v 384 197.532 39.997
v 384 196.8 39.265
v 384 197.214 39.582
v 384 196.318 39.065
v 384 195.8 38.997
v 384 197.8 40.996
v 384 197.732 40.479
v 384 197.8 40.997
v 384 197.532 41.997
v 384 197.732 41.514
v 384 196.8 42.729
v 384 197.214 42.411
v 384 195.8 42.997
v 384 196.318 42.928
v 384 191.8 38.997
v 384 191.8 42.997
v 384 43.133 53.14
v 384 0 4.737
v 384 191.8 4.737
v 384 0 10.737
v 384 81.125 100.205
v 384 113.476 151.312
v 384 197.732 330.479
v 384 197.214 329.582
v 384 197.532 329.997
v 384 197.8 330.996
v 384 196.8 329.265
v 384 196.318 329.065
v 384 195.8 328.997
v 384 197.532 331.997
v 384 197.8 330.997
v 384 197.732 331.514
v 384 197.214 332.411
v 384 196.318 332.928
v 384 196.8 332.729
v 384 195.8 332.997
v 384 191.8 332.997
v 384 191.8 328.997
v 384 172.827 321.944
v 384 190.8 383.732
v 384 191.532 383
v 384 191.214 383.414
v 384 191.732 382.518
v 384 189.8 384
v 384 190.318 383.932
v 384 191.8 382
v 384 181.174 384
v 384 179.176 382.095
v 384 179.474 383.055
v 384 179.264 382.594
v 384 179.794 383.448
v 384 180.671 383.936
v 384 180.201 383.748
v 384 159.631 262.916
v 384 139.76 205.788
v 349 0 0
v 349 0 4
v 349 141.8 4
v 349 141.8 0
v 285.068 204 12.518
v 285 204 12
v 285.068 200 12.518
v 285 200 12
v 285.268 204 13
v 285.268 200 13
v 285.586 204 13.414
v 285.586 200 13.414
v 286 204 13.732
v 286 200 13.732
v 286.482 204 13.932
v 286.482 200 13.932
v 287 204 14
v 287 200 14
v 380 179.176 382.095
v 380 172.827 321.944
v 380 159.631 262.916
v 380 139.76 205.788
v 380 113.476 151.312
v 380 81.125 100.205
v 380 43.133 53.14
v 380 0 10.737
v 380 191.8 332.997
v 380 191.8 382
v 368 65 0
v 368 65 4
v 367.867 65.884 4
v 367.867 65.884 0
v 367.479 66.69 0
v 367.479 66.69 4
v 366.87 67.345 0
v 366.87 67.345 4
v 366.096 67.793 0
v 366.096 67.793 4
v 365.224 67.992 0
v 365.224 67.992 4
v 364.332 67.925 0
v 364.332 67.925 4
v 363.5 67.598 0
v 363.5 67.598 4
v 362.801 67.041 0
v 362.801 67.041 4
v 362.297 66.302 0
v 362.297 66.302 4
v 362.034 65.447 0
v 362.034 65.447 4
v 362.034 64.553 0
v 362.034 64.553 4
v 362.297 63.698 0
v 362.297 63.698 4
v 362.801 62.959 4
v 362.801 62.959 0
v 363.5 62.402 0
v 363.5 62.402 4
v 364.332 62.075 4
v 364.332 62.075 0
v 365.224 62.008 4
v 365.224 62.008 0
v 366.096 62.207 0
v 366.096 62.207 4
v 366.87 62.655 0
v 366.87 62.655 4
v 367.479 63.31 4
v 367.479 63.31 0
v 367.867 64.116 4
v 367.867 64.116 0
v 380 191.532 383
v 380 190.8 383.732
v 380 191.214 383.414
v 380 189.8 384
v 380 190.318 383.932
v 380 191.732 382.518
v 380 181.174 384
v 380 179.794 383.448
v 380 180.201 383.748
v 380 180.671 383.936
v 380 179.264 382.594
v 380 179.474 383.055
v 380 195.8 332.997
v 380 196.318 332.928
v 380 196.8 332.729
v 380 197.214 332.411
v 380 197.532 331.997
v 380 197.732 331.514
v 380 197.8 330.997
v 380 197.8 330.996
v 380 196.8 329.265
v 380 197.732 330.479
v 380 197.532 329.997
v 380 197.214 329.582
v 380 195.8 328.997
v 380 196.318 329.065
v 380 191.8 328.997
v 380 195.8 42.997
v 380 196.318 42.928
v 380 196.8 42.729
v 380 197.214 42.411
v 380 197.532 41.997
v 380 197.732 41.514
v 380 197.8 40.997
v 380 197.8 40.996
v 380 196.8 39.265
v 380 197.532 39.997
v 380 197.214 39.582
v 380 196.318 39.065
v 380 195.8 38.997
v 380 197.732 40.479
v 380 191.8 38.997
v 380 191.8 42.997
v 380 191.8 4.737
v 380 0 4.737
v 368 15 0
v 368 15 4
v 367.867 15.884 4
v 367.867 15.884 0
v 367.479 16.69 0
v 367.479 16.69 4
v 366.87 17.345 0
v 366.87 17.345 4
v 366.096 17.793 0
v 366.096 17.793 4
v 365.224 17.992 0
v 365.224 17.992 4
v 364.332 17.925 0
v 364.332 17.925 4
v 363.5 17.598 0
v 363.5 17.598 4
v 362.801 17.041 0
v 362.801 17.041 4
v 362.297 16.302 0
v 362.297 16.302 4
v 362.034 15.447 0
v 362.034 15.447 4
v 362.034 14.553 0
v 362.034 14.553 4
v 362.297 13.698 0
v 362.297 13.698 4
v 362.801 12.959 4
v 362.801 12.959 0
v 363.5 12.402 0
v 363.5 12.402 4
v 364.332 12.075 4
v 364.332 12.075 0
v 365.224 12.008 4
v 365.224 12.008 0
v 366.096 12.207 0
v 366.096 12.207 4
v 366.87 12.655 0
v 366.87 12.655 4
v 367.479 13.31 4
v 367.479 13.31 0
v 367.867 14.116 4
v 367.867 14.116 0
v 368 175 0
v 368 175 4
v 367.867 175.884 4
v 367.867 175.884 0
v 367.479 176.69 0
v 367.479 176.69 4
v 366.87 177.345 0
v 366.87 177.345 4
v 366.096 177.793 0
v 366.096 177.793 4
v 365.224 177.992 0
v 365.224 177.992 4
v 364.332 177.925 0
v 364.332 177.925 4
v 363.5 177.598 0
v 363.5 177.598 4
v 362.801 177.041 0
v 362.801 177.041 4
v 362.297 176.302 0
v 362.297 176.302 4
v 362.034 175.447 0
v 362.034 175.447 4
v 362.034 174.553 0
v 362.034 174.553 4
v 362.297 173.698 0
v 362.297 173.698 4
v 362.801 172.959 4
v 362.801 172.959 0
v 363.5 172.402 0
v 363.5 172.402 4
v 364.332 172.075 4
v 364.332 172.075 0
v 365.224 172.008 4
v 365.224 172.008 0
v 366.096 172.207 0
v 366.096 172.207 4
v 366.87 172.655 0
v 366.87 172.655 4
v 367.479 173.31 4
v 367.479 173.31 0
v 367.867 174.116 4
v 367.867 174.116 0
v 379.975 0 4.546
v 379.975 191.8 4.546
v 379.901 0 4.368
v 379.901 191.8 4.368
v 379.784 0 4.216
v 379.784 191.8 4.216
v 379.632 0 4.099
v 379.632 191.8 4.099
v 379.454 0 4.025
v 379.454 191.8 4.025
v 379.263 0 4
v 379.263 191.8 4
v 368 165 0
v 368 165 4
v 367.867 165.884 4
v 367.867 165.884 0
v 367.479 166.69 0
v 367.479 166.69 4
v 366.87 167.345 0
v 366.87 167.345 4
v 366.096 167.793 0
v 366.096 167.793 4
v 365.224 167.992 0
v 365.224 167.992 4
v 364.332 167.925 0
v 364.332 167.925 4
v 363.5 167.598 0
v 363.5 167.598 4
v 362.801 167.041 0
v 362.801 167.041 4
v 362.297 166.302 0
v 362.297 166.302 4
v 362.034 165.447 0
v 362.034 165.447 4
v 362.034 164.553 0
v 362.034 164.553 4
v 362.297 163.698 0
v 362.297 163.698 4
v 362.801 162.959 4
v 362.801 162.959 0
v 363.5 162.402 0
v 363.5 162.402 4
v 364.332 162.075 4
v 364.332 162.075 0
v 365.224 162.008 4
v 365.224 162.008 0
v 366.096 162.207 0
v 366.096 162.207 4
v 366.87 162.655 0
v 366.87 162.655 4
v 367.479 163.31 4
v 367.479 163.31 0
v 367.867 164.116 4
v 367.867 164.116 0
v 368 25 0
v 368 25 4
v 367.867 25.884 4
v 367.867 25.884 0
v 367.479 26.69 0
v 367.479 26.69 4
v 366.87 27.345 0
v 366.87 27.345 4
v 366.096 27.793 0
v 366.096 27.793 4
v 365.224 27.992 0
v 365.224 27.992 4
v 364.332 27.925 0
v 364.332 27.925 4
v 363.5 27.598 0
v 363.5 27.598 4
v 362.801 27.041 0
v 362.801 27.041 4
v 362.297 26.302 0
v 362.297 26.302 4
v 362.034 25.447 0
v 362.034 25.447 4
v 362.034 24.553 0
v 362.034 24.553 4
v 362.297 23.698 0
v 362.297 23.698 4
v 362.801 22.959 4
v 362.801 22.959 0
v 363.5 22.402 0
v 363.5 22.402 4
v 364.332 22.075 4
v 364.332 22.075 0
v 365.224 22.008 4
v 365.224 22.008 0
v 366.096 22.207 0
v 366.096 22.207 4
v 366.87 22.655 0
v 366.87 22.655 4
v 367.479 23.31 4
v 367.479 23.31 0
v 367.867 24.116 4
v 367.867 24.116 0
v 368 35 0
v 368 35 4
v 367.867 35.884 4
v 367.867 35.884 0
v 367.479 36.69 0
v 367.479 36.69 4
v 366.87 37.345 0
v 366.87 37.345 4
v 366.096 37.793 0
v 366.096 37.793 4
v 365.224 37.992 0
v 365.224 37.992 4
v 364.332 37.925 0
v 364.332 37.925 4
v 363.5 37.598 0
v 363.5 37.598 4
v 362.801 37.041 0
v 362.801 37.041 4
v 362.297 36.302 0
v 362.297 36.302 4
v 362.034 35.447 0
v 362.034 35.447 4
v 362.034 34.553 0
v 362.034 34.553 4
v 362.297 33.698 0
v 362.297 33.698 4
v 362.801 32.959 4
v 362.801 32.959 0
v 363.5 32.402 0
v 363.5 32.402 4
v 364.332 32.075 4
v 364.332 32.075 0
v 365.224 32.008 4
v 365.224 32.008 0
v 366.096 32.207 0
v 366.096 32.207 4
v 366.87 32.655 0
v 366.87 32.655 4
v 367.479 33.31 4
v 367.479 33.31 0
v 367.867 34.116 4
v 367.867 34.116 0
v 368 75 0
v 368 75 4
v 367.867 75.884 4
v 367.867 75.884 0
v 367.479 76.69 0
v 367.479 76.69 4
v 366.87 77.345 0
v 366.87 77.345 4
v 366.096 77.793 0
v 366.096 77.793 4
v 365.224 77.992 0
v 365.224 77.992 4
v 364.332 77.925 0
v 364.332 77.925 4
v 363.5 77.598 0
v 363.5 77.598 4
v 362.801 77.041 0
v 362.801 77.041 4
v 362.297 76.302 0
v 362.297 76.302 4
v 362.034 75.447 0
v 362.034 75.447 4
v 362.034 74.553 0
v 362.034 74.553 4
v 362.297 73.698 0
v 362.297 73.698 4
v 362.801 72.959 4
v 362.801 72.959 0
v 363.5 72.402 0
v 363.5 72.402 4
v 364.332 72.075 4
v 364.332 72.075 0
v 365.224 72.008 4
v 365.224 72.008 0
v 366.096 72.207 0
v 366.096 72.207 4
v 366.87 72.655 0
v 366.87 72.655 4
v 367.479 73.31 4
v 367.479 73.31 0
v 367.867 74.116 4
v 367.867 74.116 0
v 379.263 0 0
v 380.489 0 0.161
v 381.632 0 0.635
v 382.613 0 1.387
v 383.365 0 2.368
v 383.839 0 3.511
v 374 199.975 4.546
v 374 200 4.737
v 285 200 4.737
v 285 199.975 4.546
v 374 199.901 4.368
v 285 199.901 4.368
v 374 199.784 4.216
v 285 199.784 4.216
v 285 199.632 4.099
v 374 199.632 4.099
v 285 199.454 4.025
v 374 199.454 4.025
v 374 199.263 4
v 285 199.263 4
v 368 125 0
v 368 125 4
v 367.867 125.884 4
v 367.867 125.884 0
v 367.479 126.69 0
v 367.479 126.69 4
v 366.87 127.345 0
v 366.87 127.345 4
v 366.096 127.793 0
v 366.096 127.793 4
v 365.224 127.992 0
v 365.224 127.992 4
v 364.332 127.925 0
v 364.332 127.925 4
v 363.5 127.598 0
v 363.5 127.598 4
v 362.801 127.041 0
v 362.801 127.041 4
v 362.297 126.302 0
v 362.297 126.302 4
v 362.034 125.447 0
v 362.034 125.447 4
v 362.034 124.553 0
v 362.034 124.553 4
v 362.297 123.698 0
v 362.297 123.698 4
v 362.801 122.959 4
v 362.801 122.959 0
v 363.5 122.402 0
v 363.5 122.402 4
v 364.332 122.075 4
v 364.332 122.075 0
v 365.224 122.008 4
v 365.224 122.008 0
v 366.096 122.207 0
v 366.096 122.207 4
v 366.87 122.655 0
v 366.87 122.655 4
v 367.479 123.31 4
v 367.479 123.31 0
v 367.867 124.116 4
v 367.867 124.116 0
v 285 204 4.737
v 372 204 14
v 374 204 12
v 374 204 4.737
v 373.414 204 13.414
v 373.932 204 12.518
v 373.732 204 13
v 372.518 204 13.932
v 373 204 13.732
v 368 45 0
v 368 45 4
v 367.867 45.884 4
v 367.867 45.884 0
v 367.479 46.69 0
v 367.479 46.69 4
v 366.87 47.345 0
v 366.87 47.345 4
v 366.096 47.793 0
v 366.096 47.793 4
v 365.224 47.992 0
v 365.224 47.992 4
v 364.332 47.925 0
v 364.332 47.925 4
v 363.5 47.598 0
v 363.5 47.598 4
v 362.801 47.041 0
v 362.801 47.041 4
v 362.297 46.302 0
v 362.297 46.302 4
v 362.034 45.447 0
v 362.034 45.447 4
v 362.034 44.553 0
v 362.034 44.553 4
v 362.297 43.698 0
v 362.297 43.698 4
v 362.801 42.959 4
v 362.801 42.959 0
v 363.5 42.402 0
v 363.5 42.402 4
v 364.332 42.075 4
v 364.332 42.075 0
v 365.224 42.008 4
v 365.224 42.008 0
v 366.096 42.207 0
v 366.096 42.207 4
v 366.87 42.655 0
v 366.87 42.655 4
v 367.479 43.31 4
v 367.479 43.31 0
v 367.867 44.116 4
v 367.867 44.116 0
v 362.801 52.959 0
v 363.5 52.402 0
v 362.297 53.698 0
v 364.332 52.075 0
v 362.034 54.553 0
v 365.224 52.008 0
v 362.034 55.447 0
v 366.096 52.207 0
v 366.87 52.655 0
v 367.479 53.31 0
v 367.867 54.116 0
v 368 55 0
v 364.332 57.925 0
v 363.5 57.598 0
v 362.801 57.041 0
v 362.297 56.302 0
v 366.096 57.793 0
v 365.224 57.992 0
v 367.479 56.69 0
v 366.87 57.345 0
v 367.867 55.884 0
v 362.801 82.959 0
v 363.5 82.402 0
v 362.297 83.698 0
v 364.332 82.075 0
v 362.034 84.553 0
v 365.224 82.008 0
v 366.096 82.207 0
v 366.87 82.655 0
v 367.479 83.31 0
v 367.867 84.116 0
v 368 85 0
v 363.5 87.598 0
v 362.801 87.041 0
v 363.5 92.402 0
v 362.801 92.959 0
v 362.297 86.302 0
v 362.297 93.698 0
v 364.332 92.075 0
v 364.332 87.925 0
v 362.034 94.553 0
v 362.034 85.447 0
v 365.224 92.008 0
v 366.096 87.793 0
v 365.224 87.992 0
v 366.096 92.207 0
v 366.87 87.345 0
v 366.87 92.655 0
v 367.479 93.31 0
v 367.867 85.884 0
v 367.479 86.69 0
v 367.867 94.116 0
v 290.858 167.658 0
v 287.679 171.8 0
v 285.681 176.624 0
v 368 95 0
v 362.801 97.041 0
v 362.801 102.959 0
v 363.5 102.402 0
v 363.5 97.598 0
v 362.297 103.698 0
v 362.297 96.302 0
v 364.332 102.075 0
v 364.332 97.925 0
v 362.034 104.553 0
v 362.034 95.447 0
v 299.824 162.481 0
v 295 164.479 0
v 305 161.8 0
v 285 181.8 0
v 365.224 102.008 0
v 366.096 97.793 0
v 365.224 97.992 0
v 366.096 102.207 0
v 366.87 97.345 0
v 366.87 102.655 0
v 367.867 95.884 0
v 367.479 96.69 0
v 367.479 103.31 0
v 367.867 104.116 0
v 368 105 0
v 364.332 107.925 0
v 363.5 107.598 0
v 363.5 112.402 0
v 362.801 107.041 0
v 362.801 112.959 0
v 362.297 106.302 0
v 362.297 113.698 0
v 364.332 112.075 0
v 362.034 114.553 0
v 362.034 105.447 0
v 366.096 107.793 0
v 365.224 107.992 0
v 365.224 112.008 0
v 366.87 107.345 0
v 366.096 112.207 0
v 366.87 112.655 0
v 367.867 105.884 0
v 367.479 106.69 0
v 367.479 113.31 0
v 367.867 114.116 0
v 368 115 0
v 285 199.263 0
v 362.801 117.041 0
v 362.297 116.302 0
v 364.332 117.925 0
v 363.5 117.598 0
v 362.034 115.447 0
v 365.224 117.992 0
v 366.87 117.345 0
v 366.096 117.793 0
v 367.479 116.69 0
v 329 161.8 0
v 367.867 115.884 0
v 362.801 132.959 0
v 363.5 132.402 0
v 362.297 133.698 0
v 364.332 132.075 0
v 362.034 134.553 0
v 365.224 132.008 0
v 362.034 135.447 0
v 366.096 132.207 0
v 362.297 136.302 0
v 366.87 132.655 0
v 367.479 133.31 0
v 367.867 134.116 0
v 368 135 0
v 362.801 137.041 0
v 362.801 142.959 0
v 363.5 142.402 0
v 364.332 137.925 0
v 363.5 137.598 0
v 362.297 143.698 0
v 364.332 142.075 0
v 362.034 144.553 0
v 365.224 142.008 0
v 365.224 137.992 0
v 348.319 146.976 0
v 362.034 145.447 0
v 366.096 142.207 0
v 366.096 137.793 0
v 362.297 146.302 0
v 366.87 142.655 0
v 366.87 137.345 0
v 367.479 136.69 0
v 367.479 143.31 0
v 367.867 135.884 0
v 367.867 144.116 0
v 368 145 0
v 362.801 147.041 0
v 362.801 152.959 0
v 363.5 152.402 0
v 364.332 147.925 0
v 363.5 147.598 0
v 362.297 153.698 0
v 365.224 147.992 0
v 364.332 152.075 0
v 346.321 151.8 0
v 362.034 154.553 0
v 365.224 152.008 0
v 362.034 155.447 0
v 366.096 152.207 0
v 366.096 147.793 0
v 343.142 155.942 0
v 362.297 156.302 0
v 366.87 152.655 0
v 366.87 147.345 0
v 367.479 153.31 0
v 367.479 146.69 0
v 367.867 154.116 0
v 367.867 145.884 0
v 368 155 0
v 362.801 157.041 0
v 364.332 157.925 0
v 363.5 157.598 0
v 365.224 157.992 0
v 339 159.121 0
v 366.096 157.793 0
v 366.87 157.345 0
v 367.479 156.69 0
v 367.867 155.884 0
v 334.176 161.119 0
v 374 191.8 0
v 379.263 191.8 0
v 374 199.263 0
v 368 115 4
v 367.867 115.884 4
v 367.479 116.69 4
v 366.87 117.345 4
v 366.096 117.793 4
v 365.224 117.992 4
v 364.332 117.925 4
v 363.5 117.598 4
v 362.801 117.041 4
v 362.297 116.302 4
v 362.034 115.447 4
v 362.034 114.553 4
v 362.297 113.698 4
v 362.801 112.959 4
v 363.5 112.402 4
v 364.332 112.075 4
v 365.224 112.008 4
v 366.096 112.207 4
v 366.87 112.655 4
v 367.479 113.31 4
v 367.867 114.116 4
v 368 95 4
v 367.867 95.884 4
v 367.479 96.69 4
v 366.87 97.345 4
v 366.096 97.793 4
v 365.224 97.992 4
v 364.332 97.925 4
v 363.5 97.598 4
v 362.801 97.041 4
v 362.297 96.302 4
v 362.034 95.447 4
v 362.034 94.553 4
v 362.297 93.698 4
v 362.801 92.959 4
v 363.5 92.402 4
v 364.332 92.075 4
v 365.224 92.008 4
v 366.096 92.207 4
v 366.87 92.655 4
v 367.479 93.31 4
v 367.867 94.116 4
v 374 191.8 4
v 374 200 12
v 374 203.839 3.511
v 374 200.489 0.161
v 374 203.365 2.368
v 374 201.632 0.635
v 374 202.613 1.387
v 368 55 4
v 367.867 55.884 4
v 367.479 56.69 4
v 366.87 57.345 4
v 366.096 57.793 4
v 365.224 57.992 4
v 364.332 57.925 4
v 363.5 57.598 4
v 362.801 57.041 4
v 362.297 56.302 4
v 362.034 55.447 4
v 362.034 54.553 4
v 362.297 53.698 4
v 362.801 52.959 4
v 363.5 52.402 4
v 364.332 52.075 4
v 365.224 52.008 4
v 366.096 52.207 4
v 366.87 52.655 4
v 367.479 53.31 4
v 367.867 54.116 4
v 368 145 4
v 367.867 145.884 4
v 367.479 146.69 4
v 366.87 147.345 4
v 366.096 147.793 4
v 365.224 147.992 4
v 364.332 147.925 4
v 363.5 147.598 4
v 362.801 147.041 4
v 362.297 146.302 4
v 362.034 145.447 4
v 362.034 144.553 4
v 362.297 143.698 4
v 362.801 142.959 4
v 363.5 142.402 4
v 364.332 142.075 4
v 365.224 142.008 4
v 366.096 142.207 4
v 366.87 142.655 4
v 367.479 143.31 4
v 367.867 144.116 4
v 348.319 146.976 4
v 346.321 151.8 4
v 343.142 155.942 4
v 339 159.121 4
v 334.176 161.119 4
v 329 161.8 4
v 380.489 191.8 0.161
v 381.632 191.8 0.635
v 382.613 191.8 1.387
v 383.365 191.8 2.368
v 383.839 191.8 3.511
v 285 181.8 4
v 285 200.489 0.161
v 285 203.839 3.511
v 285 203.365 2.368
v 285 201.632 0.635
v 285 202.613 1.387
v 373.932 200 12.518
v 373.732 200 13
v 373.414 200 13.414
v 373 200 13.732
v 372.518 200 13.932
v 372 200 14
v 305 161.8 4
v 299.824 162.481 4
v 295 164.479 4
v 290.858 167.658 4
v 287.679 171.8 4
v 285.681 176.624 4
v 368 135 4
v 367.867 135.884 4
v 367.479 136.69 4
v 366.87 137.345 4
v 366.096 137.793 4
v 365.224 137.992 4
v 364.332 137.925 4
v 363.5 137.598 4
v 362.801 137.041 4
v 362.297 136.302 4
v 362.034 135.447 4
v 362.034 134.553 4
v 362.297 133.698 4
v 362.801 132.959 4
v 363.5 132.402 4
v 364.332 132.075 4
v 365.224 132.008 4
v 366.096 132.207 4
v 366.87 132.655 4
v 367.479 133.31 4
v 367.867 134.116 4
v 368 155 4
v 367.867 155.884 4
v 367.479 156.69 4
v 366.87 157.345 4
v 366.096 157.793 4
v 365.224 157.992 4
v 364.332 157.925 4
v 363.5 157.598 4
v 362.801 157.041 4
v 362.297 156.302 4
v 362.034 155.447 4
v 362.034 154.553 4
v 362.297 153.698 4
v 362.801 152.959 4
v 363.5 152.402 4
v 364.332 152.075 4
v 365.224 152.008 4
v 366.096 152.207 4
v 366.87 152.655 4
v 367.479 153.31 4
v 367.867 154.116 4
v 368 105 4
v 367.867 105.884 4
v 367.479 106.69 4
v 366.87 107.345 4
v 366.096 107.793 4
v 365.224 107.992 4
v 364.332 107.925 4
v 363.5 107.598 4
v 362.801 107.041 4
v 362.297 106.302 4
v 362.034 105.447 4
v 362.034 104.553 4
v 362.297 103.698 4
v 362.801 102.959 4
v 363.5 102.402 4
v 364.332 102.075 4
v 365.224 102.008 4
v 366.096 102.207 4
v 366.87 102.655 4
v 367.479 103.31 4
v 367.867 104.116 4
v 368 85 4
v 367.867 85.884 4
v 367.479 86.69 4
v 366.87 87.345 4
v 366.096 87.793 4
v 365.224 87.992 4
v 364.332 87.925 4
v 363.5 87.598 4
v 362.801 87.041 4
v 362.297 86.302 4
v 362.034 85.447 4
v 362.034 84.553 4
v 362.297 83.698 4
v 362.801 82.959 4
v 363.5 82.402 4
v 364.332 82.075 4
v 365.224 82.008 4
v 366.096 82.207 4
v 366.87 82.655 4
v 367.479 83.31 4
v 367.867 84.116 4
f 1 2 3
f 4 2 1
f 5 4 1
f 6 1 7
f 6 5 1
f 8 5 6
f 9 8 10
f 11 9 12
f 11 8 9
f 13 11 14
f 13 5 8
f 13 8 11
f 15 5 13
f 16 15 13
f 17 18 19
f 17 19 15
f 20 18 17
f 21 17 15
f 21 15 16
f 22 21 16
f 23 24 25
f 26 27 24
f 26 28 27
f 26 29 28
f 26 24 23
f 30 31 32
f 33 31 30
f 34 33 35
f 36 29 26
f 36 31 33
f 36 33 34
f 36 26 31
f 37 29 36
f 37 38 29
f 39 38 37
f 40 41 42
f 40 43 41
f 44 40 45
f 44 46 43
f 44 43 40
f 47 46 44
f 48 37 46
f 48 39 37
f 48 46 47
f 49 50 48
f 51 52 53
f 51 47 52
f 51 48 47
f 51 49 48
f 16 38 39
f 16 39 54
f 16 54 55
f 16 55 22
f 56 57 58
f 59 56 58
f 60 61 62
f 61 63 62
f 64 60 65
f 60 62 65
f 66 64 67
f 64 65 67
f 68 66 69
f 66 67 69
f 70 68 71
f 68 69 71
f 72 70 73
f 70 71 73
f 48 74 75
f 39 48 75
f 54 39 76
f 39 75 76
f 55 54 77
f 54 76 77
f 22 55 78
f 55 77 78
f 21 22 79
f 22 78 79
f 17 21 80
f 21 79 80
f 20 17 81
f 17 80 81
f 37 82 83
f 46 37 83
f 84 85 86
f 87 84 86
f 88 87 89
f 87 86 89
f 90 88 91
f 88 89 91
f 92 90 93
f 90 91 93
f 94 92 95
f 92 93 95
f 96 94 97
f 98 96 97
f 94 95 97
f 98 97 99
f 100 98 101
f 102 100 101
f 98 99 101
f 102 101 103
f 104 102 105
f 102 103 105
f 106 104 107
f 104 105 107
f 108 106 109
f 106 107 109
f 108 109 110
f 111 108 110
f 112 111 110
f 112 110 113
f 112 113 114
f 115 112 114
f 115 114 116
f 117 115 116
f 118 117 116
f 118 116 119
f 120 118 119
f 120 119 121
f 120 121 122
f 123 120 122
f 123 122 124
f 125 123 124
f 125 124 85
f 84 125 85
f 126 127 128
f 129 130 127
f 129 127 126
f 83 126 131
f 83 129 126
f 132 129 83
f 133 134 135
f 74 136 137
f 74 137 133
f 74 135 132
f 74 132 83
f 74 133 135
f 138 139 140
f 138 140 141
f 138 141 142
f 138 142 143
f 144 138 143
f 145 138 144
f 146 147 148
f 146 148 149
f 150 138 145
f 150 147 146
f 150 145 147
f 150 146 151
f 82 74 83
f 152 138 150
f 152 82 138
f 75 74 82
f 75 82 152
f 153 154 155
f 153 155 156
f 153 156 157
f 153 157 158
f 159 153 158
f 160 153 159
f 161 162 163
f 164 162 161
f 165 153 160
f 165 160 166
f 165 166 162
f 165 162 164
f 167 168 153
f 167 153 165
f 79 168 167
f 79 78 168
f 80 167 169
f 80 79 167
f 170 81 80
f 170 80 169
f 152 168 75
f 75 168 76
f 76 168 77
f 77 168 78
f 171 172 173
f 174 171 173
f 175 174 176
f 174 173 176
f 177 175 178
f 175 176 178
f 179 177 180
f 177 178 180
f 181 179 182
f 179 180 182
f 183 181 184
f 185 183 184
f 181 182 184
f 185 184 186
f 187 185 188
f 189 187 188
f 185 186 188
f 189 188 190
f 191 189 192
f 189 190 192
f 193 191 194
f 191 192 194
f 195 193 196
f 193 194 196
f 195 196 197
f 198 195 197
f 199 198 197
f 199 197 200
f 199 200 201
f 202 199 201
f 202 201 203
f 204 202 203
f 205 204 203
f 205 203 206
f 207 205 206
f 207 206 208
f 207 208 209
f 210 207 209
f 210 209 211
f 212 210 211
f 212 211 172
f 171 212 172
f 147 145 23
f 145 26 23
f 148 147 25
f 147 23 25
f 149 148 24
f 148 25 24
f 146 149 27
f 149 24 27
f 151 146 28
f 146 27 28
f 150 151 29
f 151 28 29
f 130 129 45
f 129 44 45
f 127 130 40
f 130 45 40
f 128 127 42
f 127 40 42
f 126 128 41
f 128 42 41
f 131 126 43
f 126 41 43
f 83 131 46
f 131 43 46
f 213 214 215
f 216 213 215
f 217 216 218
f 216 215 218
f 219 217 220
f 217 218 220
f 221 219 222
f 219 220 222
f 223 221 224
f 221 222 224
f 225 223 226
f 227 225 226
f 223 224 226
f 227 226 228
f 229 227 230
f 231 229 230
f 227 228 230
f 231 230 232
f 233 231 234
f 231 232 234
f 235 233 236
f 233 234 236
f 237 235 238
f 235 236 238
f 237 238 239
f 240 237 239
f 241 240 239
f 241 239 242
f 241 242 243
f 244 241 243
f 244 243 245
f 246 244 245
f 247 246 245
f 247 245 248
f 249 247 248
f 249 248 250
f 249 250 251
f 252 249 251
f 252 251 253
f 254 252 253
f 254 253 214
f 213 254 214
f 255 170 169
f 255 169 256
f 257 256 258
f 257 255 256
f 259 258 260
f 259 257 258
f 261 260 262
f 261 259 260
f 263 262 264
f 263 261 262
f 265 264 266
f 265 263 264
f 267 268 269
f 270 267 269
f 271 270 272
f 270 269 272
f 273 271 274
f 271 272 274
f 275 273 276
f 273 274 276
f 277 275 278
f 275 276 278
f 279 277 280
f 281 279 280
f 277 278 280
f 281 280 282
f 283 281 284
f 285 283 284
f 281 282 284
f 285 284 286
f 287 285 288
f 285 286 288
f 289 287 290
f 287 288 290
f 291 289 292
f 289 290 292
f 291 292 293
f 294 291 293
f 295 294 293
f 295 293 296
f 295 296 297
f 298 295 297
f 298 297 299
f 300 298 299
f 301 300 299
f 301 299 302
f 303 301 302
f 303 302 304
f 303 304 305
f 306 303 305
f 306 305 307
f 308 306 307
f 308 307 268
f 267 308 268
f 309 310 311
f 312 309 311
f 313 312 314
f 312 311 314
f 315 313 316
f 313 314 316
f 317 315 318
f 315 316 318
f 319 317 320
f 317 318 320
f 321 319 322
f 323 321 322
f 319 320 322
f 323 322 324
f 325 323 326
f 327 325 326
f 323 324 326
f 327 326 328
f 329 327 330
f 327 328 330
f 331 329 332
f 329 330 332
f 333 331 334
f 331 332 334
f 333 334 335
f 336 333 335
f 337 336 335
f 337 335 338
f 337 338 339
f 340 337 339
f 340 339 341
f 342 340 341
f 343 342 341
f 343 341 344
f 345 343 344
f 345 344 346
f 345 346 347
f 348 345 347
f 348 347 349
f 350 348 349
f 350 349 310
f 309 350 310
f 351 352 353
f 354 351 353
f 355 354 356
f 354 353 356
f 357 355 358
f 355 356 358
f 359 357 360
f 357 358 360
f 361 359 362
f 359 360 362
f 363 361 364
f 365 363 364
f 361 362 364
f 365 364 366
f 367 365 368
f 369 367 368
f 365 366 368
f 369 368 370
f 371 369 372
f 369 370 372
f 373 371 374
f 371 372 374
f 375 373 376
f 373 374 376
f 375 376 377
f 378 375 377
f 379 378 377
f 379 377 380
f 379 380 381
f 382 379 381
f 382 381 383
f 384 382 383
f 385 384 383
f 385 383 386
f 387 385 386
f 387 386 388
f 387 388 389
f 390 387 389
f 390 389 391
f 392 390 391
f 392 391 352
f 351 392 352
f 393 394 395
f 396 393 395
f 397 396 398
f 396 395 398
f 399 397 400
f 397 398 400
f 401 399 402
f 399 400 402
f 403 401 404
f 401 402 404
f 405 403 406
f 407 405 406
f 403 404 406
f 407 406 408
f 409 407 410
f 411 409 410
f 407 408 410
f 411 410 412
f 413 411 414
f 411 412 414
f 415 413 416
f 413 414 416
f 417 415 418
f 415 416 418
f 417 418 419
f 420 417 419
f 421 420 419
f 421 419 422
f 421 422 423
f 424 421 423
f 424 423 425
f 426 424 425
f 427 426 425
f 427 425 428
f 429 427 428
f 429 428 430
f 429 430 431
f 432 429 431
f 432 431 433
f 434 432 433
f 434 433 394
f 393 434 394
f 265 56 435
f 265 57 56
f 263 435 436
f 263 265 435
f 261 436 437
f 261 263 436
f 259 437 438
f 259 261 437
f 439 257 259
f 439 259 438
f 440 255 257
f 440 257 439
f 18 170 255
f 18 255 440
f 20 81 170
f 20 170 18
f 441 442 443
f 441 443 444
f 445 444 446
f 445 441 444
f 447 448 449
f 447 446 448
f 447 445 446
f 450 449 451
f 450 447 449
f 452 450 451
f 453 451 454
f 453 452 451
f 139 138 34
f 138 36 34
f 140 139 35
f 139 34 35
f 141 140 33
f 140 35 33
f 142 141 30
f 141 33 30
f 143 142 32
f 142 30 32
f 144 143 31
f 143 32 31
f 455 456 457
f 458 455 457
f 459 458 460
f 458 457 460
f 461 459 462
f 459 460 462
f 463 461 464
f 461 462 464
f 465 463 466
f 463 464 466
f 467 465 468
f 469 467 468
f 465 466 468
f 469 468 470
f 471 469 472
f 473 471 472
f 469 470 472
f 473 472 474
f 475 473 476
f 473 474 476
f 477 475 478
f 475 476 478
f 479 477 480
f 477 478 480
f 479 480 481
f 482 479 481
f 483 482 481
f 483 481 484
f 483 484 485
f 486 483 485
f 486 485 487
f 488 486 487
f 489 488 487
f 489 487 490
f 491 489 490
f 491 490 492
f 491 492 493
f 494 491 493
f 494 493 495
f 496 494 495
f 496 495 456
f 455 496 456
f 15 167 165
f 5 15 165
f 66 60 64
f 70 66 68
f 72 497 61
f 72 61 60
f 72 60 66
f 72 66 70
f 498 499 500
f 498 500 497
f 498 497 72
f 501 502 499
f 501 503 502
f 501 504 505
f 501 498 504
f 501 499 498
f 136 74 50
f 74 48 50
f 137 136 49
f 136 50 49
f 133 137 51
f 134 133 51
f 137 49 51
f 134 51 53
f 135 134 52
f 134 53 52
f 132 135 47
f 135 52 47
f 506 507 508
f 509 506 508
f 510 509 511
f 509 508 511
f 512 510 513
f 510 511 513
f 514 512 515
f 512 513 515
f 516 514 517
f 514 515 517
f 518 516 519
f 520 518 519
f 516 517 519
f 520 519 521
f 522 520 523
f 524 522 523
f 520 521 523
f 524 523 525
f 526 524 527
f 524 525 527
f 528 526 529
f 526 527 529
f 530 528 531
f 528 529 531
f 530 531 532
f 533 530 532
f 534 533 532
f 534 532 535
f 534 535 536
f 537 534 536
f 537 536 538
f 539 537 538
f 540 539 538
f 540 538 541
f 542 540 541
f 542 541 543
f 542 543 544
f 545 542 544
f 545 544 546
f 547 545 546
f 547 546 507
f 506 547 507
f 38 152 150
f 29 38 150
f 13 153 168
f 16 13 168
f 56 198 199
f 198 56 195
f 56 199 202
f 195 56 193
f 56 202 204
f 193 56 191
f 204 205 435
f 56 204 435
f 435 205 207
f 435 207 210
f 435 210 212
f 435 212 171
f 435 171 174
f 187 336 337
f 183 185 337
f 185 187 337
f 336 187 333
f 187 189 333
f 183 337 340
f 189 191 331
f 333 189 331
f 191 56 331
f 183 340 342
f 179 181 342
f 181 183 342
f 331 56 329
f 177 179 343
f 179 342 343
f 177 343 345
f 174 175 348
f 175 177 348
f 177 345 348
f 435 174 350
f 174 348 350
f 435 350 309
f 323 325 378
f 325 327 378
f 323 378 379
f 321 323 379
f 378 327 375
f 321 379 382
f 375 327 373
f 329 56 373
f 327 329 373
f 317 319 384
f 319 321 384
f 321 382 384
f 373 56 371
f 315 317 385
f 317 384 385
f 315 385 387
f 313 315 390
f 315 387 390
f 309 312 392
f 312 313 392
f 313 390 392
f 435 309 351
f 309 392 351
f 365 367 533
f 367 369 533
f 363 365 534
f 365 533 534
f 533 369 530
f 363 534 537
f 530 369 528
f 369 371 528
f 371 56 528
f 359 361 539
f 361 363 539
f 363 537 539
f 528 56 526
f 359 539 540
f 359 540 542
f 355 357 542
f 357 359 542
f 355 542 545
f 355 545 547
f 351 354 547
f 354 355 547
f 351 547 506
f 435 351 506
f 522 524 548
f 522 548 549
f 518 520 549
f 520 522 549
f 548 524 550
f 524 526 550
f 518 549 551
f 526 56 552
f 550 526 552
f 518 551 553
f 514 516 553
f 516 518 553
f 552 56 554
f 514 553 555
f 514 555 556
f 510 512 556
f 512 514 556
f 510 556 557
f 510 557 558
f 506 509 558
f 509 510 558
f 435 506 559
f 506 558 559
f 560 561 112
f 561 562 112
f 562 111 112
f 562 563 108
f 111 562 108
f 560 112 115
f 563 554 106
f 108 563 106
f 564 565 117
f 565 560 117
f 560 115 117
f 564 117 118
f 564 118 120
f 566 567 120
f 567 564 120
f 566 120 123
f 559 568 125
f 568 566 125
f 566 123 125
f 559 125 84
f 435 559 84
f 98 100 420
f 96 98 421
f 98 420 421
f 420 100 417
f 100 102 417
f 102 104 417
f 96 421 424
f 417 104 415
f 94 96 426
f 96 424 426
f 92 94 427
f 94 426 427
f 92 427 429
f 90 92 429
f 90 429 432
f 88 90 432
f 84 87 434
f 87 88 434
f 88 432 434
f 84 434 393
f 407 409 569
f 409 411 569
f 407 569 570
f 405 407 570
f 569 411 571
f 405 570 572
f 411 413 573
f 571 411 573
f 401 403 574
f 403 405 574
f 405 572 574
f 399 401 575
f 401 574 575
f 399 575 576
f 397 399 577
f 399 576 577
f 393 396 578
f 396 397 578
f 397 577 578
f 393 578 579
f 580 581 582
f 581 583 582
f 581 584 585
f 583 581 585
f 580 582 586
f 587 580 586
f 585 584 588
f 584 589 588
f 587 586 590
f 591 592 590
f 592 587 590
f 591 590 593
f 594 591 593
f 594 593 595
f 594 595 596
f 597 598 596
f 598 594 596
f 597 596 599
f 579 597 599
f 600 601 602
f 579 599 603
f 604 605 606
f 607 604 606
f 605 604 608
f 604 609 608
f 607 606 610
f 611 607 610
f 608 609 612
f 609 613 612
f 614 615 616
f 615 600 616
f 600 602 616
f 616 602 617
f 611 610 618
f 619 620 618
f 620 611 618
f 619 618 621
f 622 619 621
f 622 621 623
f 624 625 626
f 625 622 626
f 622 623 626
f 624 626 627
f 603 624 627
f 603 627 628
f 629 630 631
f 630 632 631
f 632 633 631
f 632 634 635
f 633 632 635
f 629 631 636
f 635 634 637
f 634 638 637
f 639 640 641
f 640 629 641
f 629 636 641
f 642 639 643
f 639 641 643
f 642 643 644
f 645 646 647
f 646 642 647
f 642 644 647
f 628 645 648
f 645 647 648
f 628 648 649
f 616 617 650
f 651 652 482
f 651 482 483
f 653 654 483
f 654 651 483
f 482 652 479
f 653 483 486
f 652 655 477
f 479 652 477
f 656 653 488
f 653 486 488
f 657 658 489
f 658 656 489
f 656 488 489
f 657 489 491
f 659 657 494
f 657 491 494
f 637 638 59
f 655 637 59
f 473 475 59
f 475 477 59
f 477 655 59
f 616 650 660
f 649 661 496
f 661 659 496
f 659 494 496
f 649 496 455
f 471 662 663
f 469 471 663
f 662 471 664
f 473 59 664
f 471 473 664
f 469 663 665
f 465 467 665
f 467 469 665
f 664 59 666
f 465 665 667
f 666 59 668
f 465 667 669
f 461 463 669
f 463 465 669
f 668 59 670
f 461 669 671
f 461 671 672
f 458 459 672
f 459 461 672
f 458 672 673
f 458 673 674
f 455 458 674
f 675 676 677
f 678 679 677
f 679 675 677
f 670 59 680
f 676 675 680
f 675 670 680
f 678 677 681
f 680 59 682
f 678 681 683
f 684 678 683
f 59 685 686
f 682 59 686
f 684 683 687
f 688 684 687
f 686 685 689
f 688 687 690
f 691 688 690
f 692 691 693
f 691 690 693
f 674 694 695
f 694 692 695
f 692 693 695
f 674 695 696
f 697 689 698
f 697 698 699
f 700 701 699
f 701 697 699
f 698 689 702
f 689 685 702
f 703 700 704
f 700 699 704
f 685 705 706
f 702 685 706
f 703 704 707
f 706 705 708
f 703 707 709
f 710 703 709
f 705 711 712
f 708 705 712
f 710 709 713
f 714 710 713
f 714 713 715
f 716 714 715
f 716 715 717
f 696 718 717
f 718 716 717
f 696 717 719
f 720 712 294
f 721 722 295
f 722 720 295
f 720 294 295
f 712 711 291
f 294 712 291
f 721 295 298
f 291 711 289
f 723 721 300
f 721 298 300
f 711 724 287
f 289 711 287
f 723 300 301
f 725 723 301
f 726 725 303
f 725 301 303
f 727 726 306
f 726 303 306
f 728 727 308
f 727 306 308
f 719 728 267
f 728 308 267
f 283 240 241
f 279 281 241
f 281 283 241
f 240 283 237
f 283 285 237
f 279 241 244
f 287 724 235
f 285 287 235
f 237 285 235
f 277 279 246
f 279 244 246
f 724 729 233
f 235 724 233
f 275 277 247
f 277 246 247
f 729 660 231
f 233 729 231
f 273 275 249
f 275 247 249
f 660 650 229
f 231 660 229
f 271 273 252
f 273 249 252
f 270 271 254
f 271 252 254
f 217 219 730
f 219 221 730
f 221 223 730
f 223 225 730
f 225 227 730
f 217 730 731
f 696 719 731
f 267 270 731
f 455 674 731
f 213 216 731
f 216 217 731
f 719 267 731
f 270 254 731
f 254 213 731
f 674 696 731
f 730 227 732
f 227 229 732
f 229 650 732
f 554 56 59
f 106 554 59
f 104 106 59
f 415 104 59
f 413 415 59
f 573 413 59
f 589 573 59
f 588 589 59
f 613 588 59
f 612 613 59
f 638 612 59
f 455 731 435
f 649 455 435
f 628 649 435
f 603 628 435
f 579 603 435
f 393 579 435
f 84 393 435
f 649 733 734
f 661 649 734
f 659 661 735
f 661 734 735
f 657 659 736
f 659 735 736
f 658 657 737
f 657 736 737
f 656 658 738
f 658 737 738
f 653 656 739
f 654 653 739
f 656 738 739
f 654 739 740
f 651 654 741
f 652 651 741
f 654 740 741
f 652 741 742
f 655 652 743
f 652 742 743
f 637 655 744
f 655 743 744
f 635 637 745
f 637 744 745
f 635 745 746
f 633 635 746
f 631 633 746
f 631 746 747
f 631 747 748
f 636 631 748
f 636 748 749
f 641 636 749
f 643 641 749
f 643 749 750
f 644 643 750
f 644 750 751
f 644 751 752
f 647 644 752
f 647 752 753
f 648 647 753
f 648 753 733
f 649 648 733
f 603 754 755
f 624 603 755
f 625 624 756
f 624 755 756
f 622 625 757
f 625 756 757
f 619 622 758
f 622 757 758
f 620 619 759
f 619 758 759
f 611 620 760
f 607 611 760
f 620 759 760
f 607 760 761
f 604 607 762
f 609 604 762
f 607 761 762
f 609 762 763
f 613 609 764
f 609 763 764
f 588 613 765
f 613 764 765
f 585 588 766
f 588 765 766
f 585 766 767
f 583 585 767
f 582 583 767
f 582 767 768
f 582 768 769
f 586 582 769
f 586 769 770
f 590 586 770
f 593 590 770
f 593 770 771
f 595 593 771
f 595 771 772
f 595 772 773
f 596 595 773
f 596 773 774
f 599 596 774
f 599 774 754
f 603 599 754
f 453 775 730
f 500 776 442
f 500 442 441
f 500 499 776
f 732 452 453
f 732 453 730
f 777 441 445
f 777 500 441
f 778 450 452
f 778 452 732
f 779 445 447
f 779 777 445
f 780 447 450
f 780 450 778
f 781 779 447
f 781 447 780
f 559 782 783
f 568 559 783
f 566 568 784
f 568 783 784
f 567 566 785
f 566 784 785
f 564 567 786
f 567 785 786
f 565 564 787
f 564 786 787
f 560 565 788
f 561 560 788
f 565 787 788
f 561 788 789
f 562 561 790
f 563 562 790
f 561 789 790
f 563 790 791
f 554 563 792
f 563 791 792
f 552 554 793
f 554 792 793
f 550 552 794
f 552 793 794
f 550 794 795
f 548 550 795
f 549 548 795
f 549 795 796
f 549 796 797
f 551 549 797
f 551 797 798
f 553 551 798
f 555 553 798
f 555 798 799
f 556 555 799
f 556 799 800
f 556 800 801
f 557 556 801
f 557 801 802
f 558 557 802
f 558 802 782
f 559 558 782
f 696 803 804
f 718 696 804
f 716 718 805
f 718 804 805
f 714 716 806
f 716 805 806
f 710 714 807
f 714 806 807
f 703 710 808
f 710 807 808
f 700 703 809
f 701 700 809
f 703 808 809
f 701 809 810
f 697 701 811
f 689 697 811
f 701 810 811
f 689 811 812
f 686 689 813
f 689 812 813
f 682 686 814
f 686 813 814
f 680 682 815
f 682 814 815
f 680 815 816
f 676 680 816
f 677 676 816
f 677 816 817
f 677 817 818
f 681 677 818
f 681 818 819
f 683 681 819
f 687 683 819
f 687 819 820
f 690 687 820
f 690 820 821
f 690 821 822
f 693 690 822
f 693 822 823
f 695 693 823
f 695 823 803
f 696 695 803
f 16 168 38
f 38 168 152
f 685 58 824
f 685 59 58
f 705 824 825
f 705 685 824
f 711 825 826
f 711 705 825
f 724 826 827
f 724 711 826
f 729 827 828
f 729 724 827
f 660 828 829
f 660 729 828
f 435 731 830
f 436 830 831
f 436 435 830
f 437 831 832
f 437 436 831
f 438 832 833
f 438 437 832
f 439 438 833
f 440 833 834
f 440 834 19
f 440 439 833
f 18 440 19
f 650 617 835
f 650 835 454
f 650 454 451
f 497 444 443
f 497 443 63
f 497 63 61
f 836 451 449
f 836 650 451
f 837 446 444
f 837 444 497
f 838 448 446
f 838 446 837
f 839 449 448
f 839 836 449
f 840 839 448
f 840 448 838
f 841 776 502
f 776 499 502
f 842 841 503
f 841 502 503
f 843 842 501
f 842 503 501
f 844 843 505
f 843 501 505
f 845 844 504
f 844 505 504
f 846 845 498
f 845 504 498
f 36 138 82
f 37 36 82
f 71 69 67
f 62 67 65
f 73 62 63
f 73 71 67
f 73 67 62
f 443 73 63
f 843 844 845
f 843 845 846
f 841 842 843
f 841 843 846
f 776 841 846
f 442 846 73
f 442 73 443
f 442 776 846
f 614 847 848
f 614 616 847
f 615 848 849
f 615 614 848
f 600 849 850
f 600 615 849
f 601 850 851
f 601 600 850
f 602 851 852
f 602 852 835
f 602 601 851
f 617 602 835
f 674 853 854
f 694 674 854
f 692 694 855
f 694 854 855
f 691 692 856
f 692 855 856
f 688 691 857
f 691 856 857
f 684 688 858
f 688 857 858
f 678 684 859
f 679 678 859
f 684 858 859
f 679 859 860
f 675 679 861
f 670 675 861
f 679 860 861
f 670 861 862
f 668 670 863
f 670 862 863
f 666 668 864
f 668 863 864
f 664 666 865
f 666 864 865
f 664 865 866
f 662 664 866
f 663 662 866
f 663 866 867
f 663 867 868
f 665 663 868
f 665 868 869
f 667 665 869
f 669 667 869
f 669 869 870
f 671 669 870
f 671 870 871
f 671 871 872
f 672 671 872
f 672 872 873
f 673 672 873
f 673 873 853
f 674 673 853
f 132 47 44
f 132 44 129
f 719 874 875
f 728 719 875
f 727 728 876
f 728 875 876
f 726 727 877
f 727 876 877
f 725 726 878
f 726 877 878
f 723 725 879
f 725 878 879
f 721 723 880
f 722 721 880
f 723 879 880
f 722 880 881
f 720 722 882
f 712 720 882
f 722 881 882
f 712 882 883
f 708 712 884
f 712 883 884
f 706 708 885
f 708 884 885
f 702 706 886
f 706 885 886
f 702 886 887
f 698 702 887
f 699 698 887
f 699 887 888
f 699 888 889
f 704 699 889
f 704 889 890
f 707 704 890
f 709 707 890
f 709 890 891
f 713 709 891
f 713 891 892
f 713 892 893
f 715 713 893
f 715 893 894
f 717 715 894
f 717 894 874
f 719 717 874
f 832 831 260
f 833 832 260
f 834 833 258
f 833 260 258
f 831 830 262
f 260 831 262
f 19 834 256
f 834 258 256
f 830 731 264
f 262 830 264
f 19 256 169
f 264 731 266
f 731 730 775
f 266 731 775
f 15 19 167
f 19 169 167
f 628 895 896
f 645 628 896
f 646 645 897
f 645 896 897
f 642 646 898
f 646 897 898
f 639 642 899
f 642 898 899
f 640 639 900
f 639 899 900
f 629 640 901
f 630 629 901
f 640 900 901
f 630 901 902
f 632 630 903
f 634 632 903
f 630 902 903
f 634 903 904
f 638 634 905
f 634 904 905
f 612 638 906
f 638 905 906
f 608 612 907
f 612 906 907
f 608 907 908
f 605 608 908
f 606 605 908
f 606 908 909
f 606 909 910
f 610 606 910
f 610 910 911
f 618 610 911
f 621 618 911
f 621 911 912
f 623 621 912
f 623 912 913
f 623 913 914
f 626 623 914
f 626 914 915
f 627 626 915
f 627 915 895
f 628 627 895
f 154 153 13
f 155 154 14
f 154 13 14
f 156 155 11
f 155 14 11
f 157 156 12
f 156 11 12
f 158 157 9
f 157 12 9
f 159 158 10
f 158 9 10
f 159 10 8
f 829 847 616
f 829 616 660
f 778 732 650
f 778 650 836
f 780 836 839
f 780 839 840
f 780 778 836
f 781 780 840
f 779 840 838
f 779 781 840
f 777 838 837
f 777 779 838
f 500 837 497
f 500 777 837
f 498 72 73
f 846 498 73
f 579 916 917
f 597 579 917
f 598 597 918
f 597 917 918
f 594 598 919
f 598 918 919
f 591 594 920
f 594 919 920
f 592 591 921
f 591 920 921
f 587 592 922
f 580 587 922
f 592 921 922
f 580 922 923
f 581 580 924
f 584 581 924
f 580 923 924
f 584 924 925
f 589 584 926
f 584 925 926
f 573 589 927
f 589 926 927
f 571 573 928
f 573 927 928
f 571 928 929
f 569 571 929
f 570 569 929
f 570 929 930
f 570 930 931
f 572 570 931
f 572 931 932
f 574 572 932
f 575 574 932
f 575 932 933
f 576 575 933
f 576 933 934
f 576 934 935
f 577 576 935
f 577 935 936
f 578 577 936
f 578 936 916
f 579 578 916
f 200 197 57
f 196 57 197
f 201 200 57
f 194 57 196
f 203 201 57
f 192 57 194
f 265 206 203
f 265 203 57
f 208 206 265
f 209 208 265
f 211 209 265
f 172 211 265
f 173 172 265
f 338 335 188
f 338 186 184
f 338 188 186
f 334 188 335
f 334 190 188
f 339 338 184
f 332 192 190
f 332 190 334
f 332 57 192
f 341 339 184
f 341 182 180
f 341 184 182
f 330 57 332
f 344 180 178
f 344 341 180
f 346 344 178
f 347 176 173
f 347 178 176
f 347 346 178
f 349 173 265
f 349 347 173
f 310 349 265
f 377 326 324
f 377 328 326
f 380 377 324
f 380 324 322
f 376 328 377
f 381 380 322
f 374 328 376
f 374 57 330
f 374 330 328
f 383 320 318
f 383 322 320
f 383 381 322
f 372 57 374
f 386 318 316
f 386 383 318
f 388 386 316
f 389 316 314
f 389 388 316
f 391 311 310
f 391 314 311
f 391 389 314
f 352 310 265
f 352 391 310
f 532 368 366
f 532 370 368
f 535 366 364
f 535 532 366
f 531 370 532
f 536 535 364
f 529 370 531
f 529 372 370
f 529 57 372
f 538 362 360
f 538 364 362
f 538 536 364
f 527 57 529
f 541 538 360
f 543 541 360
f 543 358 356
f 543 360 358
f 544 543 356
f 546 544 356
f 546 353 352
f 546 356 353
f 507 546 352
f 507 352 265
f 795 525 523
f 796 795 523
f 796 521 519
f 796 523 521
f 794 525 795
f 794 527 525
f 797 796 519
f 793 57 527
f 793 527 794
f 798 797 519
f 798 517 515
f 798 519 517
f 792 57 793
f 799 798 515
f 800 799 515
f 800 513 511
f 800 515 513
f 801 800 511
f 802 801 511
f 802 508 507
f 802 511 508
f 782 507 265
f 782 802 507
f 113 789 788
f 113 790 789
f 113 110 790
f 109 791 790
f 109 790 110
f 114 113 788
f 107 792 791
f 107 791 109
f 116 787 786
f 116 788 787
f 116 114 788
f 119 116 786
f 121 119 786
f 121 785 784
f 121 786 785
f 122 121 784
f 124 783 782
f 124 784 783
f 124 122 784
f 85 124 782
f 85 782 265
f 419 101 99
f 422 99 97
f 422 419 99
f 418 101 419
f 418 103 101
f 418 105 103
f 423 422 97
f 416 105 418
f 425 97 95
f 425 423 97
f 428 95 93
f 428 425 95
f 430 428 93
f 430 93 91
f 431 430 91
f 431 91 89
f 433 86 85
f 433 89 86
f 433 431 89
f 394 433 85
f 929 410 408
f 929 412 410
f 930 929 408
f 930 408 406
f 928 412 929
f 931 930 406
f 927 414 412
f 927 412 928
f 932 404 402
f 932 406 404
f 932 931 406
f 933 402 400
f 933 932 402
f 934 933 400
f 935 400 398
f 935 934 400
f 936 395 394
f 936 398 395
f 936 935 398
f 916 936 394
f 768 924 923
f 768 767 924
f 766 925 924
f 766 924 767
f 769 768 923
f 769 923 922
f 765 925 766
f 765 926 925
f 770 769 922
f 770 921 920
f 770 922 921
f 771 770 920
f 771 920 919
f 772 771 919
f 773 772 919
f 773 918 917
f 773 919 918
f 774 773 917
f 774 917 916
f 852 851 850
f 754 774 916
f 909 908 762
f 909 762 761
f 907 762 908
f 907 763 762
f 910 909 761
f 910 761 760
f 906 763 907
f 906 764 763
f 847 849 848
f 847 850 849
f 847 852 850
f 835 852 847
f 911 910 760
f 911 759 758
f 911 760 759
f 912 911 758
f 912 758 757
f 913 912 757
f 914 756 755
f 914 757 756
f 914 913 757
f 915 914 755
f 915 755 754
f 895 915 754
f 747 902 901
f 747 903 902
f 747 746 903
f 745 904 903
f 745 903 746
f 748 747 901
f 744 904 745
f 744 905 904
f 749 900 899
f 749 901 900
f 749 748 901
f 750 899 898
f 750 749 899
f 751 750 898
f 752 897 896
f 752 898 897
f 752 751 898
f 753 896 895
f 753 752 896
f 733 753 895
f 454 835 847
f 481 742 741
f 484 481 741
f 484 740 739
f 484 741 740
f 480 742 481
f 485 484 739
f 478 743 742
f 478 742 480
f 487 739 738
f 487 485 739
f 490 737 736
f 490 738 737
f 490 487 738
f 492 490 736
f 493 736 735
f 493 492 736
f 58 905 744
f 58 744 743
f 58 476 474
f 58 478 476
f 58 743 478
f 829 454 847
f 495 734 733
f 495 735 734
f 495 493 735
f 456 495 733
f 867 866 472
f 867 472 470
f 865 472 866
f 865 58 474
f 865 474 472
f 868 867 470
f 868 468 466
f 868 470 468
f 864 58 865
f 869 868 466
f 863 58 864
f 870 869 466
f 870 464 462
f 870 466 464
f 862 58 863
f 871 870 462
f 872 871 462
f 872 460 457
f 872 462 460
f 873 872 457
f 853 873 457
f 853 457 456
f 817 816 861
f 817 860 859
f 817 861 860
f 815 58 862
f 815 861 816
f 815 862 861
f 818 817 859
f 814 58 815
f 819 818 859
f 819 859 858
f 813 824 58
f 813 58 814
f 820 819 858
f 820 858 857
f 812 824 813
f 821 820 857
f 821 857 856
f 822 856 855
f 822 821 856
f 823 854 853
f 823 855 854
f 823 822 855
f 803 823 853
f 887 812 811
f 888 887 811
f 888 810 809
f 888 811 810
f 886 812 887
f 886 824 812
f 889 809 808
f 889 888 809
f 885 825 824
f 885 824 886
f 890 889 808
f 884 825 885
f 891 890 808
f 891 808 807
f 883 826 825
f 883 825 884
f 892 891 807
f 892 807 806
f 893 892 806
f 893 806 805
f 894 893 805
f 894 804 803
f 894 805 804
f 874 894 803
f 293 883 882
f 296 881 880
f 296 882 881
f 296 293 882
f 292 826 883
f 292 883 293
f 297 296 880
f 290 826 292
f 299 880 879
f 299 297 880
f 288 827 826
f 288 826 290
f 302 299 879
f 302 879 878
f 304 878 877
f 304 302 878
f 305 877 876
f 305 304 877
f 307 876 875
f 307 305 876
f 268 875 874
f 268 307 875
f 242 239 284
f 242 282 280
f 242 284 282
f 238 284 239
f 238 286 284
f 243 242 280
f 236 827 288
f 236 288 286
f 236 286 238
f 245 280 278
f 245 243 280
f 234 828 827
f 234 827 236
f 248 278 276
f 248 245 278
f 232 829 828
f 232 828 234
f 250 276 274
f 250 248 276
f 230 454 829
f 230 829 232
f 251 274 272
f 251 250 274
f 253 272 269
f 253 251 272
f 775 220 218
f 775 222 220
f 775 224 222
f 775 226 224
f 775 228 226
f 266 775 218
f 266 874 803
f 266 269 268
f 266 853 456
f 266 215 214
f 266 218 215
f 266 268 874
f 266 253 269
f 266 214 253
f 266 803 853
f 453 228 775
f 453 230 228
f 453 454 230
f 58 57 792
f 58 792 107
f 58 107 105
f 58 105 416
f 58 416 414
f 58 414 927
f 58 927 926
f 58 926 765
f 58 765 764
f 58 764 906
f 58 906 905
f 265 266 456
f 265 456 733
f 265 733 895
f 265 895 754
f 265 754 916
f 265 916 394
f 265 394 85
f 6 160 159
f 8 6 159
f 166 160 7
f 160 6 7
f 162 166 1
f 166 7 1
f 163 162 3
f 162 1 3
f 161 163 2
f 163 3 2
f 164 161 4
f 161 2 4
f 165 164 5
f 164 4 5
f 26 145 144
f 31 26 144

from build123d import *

# Parameters (mm, degrees)
SKETCH1_W                    = 380
SKETCH1_H                    = 200
BASE_FLANGE1_DEPTH           = 4
EDGE_FLANGE1_STRIP_W         = 17.4732
EDGE_FLANGE1_STRIP_H         = 4
EDGE_FLANGE1_STRIP_CUT_DEPTH = 380
EDGE_FLANGE1_DEPTH           = 380
EDGE_FLANGE2_STRIP_W         = 17.4732
EDGE_FLANGE2_STRIP_H         = 4
EDGE_FLANGE2_STRIP_CUT_DEPTH = 199.2634
EDGE_FLANGE2_DEPTH           = 199.2634
EDGE_FLANGE3_STRIP_W         = 17.4732
EDGE_FLANGE3_STRIP_H         = 4
EDGE_FLANGE3_STRIP_CUT_DEPTH = 199.2634
EDGE_FLANGE3_DEPTH           = 199.2634
EXTRUDE1_DEPTH               = 583.765819176
EXTRUDE2_DEPTH               = 583.765819176
FILLET1_R                    = 2
SKETCH15_W                   = 23.472504697
SKETCH15_H                   = 33.276719244
EXTRUDE6_DEPTH               = 10
SKETCH16_W                   = 26.053110818
SKETCH16_H                   = 17.698317339
EXTRUDE7_DEPTH               = 10
FILLET2_R                    = 2
SKETCH17_W                   = 318
SKETCH17_H                   = 161.8
EXTRUDE8_DEPTH               = 578.470345559
FILLET3_R                    = 20
SKETCH18_R                   = 3
EXTRUDE9_DEPTH               = 578.470345559
LPATTERN1_COUNT              = 17
LPATTERN1_PITCH              = 10
SKETCH20_W                   = 800
SKETCH20_H                   = 800
EXTRUDE15_DEPTH              = 581.110334333
FILLET4_R                    = 20
FILLET5_R                    = 2
FILLET6_R                    = 2


# Sheet-metal steps are written as plain solids
with BuildPart() as part:
    # Sketch1 → Base-Flange1 (new body)
    with BuildSketch(Plane.XY):
        with Locations((190, 100)):
            Rectangle(SKETCH1_W, SKETCH1_H)
    extrude(amount=BASE_FLANGE1_DEPTH)

    # Edge-Flange1 strip (across the edge) → Edge-Flange1 strip cut (cut)
    with BuildSketch(Plane(origin=(380, 200, 4), x_dir=(0, -1, 0), z_dir=(-1, 0, 0))):
        with Locations((-8, -2)):
            Rectangle(EDGE_FLANGE1_STRIP_W, EDGE_FLANGE1_STRIP_H)
    extrude(amount=EDGE_FLANGE1_STRIP_CUT_DEPTH, mode=Mode.SUBTRACT)

    # Edge-Flange1 section (across the edge) → Edge-Flange1 (add)
    with BuildSketch(Plane(origin=(380, 200, 4), x_dir=(0, -1, 0), z_dir=(-1, 0, 0))):
        with BuildLine():
            Line((-4, 0.7366), (-4, 10))
            Line((-4, 10), (0, 10))
            Line((0, 10), (0, 0.7366))
            ThreePointArc((0, 0.7366), (0.215745145, 0.215745145), (0.7366, 0))
            Line((0.7366, 0), (0.7366, -4))
            ThreePointArc((0.7366, -4), (-2.61268198, -2.61268198), (-4, 0.7366))
        make_face()
    extrude(amount=EDGE_FLANGE1_DEPTH)

    # Edge-Flange2 strip (across the edge) → Edge-Flange2 strip cut (cut)
    with BuildSketch(Plane(origin=(0, 199.2634, 4), x_dir=(1, 0, 0), z_dir=(0, -1, 0))):
        with Locations((-8, -2)):
            Rectangle(EDGE_FLANGE2_STRIP_W, EDGE_FLANGE2_STRIP_H)
    extrude(amount=EDGE_FLANGE2_STRIP_CUT_DEPTH, mode=Mode.SUBTRACT)

    # Edge-Flange2 section (across the edge) → Edge-Flange2 (add)
    with BuildSketch(Plane(origin=(0, 199.2634, 4), x_dir=(1, 0, 0), z_dir=(0, -1, 0))):
        with BuildLine():
            Line((-4, 0.7366), (-4, 380))
            Line((-4, 380), (0, 380))
            Line((0, 380), (0, 0.7366))
            ThreePointArc((0, 0.7366), (0.215745145, 0.215745145), (0.7366, 0))
            Line((0.7366, 0), (0.7366, -4))
            ThreePointArc((0.7366, -4), (-2.61268198, -2.61268198), (-4, 0.7366))
        make_face()
    extrude(amount=EDGE_FLANGE2_DEPTH)

    # Edge-Flange3 strip (across the edge) → Edge-Flange3 strip cut (cut)
    with BuildSketch(Plane(origin=(380, 0, 4), x_dir=(-1, 0, 0), z_dir=(0, 1, 0))):
        with Locations((-8, -2)):
            Rectangle(EDGE_FLANGE3_STRIP_W, EDGE_FLANGE3_STRIP_H)
    extrude(amount=EDGE_FLANGE3_STRIP_CUT_DEPTH, mode=Mode.SUBTRACT)

    # Edge-Flange3 section (across the edge) → Edge-Flange3 (add)
    with BuildSketch(Plane(origin=(380, 0, 4), x_dir=(-1, 0, 0), z_dir=(0, 1, 0))):
        with BuildLine():
            Line((-4, 0.7366), (-4, 380))
            Line((-4, 380), (0, 380))
            Line((0, 380), (0, 0.7366))
            ThreePointArc((0, 0.7366), (0.215745145, 0.215745145), (0.7366, 0))
            Line((0.7366, 0), (0.7366, -4))
            ThreePointArc((0.7366, -4), (-2.61268198, -2.61268198), (-4, 0.7366))
        make_face()
    extrude(amount=EDGE_FLANGE3_DEPTH)

    # Sketch12 → Extrude1 (cut, through all)
    with BuildSketch(Plane.ZY.offset(4)):
        with BuildLine():
            ThreePointArc((384, 179.2634), (179.031265067, 127.81319162), (10.7366, 0))
            Line((10.7366, 0), (384, 0))
            Line((384, 0), (384, 179.2634))
        make_face()
    extrude(amount=-EXTRUDE1_DEPTH, mode=Mode.SUBTRACT)

    # Sketch13 → Extrude2 (cut, through all)
    with BuildSketch(Plane.ZY.offset(4)):
        Polygon((14.85780282, 191.8), (38.9966, 191.8), (38.9966, 197.8), (42.9966, 197.8), (42.9966, 191.8), (328.9966, 191.8), (328.9966, 197.8), (332.9966, 197.8), (332.9966, 191.8), (384, 191.8), (384, 199.2634), (4.7366, 199.2634), (4.7366, 191.8), align=None)
    extrude(amount=-EXTRUDE2_DEPTH, mode=Mode.SUBTRACT)

    # Fillet1
    fillet1_edges = [part.edges().sort_by_distance(p)[0] for p in [
        (382, 197.8, 38.9966),
        (382, 197.8, 42.9966),
        (382, 197.8, 328.9966),
        (382, 197.8, 332.9966),
        (-2, 197.8, 328.9966),
        (-2, 197.8, 332.9966),
        (-2, 197.8, 42.9966),
        (-2, 197.8, 38.9966),
    ]]
    fillet(fillet1_edges, radius=FILLET1_R - 0.0001)  # a hair under: the kernel refuses the full size

    # Sketch15 → Extrude6 (cut)
    with BuildSketch(Plane.ZY.offset(4)):
        with Locations((8.784947937, 208.438359622)):
            Rectangle(SKETCH15_W, SKETCH15_H)
    extrude(amount=-EXTRUDE6_DEPTH, mode=Mode.SUBTRACT)

    # Sketch16 → Extrude7 (cut)
    with BuildSketch(Plane(origin=(384, 0, 0), x_dir=(0, 0, -1), z_dir=(1, 0, 0))):
        with Locations((-6.110925327, 200.64915867)):
            Rectangle(SKETCH16_W, SKETCH16_H)
    extrude(amount=-EXTRUDE7_DEPTH, mode=Mode.SUBTRACT)

    # Fillet2
    fillet2_edges = [part.edges().sort_by_distance(p)[0] for p in [
        (6, 202, 14),
        (374, 202, 14),
    ]]
    fillet(fillet2_edges, radius=FILLET2_R)

    # Sketch17 → Extrude8 (cut, through all)
    with BuildSketch(Plane.XY.offset(4)):
        with Locations((190, 80.9)):
            Rectangle(SKETCH17_W, SKETCH17_H)
    extrude(amount=-EXTRUDE8_DEPTH, mode=Mode.SUBTRACT)

    # Fillet3
    fillet3_edges = [part.edges().sort_by_distance(p)[0] for p in [
        (31, 161.8, 2),
        (349, 161.8, 2),
    ]]
    fillet(fillet3_edges, radius=FILLET3_R)

    # Sketch18 → Extrude9 (cut, through all)
    with BuildSketch(Plane.XY.offset(4)):
        with Locations((15, 175)):
            Circle(SKETCH18_R)
        with Locations((365, 175)):
            Circle(SKETCH18_R)
    extrude9 = extrude(amount=-EXTRUDE9_DEPTH, mode=Mode.SUBTRACT)

    # LPattern1: Extrude9 ×17
    with Locations(*[(0, -i * LPATTERN1_PITCH, 0) for i in range(1, LPATTERN1_COUNT)]):
        add(extrude9, mode=Mode.SUBTRACT)

    # Sketch20 → Extrude15 (cut, through all)
    with BuildSketch(Plane(origin=(0, 0, 0), x_dir=(-1, 0, 0), z_dir=(0, 0, -1))):
        with Locations((115, -121.057151892)):
            Rectangle(SKETCH20_W, SKETCH20_H)
    extrude(amount=-EXTRUDE15_DEPTH, mode=Mode.SUBTRACT)

    # Fillet4
    fillet4_edges = [part.edges().sort_by_distance(p)[0] for p in [
        (285, 161.8, 2),
    ]]
    fillet(fillet4_edges, radius=FILLET4_R)

    # Fillet5
    fillet5_edges = [part.edges().sort_by_distance(p)[0] for p in [
        (285, 202, 14),
    ]]
    fillet(fillet5_edges, radius=FILLET5_R)

    # Fillet6
    fillet6_edges = [part.edges().sort_by_distance(p)[0] for p in [
        (382, 179.2634, 384),
        (382, 191.8, 384),
    ]]
    fillet(fillet6_edges, radius=FILLET6_R)


solid = part.part
